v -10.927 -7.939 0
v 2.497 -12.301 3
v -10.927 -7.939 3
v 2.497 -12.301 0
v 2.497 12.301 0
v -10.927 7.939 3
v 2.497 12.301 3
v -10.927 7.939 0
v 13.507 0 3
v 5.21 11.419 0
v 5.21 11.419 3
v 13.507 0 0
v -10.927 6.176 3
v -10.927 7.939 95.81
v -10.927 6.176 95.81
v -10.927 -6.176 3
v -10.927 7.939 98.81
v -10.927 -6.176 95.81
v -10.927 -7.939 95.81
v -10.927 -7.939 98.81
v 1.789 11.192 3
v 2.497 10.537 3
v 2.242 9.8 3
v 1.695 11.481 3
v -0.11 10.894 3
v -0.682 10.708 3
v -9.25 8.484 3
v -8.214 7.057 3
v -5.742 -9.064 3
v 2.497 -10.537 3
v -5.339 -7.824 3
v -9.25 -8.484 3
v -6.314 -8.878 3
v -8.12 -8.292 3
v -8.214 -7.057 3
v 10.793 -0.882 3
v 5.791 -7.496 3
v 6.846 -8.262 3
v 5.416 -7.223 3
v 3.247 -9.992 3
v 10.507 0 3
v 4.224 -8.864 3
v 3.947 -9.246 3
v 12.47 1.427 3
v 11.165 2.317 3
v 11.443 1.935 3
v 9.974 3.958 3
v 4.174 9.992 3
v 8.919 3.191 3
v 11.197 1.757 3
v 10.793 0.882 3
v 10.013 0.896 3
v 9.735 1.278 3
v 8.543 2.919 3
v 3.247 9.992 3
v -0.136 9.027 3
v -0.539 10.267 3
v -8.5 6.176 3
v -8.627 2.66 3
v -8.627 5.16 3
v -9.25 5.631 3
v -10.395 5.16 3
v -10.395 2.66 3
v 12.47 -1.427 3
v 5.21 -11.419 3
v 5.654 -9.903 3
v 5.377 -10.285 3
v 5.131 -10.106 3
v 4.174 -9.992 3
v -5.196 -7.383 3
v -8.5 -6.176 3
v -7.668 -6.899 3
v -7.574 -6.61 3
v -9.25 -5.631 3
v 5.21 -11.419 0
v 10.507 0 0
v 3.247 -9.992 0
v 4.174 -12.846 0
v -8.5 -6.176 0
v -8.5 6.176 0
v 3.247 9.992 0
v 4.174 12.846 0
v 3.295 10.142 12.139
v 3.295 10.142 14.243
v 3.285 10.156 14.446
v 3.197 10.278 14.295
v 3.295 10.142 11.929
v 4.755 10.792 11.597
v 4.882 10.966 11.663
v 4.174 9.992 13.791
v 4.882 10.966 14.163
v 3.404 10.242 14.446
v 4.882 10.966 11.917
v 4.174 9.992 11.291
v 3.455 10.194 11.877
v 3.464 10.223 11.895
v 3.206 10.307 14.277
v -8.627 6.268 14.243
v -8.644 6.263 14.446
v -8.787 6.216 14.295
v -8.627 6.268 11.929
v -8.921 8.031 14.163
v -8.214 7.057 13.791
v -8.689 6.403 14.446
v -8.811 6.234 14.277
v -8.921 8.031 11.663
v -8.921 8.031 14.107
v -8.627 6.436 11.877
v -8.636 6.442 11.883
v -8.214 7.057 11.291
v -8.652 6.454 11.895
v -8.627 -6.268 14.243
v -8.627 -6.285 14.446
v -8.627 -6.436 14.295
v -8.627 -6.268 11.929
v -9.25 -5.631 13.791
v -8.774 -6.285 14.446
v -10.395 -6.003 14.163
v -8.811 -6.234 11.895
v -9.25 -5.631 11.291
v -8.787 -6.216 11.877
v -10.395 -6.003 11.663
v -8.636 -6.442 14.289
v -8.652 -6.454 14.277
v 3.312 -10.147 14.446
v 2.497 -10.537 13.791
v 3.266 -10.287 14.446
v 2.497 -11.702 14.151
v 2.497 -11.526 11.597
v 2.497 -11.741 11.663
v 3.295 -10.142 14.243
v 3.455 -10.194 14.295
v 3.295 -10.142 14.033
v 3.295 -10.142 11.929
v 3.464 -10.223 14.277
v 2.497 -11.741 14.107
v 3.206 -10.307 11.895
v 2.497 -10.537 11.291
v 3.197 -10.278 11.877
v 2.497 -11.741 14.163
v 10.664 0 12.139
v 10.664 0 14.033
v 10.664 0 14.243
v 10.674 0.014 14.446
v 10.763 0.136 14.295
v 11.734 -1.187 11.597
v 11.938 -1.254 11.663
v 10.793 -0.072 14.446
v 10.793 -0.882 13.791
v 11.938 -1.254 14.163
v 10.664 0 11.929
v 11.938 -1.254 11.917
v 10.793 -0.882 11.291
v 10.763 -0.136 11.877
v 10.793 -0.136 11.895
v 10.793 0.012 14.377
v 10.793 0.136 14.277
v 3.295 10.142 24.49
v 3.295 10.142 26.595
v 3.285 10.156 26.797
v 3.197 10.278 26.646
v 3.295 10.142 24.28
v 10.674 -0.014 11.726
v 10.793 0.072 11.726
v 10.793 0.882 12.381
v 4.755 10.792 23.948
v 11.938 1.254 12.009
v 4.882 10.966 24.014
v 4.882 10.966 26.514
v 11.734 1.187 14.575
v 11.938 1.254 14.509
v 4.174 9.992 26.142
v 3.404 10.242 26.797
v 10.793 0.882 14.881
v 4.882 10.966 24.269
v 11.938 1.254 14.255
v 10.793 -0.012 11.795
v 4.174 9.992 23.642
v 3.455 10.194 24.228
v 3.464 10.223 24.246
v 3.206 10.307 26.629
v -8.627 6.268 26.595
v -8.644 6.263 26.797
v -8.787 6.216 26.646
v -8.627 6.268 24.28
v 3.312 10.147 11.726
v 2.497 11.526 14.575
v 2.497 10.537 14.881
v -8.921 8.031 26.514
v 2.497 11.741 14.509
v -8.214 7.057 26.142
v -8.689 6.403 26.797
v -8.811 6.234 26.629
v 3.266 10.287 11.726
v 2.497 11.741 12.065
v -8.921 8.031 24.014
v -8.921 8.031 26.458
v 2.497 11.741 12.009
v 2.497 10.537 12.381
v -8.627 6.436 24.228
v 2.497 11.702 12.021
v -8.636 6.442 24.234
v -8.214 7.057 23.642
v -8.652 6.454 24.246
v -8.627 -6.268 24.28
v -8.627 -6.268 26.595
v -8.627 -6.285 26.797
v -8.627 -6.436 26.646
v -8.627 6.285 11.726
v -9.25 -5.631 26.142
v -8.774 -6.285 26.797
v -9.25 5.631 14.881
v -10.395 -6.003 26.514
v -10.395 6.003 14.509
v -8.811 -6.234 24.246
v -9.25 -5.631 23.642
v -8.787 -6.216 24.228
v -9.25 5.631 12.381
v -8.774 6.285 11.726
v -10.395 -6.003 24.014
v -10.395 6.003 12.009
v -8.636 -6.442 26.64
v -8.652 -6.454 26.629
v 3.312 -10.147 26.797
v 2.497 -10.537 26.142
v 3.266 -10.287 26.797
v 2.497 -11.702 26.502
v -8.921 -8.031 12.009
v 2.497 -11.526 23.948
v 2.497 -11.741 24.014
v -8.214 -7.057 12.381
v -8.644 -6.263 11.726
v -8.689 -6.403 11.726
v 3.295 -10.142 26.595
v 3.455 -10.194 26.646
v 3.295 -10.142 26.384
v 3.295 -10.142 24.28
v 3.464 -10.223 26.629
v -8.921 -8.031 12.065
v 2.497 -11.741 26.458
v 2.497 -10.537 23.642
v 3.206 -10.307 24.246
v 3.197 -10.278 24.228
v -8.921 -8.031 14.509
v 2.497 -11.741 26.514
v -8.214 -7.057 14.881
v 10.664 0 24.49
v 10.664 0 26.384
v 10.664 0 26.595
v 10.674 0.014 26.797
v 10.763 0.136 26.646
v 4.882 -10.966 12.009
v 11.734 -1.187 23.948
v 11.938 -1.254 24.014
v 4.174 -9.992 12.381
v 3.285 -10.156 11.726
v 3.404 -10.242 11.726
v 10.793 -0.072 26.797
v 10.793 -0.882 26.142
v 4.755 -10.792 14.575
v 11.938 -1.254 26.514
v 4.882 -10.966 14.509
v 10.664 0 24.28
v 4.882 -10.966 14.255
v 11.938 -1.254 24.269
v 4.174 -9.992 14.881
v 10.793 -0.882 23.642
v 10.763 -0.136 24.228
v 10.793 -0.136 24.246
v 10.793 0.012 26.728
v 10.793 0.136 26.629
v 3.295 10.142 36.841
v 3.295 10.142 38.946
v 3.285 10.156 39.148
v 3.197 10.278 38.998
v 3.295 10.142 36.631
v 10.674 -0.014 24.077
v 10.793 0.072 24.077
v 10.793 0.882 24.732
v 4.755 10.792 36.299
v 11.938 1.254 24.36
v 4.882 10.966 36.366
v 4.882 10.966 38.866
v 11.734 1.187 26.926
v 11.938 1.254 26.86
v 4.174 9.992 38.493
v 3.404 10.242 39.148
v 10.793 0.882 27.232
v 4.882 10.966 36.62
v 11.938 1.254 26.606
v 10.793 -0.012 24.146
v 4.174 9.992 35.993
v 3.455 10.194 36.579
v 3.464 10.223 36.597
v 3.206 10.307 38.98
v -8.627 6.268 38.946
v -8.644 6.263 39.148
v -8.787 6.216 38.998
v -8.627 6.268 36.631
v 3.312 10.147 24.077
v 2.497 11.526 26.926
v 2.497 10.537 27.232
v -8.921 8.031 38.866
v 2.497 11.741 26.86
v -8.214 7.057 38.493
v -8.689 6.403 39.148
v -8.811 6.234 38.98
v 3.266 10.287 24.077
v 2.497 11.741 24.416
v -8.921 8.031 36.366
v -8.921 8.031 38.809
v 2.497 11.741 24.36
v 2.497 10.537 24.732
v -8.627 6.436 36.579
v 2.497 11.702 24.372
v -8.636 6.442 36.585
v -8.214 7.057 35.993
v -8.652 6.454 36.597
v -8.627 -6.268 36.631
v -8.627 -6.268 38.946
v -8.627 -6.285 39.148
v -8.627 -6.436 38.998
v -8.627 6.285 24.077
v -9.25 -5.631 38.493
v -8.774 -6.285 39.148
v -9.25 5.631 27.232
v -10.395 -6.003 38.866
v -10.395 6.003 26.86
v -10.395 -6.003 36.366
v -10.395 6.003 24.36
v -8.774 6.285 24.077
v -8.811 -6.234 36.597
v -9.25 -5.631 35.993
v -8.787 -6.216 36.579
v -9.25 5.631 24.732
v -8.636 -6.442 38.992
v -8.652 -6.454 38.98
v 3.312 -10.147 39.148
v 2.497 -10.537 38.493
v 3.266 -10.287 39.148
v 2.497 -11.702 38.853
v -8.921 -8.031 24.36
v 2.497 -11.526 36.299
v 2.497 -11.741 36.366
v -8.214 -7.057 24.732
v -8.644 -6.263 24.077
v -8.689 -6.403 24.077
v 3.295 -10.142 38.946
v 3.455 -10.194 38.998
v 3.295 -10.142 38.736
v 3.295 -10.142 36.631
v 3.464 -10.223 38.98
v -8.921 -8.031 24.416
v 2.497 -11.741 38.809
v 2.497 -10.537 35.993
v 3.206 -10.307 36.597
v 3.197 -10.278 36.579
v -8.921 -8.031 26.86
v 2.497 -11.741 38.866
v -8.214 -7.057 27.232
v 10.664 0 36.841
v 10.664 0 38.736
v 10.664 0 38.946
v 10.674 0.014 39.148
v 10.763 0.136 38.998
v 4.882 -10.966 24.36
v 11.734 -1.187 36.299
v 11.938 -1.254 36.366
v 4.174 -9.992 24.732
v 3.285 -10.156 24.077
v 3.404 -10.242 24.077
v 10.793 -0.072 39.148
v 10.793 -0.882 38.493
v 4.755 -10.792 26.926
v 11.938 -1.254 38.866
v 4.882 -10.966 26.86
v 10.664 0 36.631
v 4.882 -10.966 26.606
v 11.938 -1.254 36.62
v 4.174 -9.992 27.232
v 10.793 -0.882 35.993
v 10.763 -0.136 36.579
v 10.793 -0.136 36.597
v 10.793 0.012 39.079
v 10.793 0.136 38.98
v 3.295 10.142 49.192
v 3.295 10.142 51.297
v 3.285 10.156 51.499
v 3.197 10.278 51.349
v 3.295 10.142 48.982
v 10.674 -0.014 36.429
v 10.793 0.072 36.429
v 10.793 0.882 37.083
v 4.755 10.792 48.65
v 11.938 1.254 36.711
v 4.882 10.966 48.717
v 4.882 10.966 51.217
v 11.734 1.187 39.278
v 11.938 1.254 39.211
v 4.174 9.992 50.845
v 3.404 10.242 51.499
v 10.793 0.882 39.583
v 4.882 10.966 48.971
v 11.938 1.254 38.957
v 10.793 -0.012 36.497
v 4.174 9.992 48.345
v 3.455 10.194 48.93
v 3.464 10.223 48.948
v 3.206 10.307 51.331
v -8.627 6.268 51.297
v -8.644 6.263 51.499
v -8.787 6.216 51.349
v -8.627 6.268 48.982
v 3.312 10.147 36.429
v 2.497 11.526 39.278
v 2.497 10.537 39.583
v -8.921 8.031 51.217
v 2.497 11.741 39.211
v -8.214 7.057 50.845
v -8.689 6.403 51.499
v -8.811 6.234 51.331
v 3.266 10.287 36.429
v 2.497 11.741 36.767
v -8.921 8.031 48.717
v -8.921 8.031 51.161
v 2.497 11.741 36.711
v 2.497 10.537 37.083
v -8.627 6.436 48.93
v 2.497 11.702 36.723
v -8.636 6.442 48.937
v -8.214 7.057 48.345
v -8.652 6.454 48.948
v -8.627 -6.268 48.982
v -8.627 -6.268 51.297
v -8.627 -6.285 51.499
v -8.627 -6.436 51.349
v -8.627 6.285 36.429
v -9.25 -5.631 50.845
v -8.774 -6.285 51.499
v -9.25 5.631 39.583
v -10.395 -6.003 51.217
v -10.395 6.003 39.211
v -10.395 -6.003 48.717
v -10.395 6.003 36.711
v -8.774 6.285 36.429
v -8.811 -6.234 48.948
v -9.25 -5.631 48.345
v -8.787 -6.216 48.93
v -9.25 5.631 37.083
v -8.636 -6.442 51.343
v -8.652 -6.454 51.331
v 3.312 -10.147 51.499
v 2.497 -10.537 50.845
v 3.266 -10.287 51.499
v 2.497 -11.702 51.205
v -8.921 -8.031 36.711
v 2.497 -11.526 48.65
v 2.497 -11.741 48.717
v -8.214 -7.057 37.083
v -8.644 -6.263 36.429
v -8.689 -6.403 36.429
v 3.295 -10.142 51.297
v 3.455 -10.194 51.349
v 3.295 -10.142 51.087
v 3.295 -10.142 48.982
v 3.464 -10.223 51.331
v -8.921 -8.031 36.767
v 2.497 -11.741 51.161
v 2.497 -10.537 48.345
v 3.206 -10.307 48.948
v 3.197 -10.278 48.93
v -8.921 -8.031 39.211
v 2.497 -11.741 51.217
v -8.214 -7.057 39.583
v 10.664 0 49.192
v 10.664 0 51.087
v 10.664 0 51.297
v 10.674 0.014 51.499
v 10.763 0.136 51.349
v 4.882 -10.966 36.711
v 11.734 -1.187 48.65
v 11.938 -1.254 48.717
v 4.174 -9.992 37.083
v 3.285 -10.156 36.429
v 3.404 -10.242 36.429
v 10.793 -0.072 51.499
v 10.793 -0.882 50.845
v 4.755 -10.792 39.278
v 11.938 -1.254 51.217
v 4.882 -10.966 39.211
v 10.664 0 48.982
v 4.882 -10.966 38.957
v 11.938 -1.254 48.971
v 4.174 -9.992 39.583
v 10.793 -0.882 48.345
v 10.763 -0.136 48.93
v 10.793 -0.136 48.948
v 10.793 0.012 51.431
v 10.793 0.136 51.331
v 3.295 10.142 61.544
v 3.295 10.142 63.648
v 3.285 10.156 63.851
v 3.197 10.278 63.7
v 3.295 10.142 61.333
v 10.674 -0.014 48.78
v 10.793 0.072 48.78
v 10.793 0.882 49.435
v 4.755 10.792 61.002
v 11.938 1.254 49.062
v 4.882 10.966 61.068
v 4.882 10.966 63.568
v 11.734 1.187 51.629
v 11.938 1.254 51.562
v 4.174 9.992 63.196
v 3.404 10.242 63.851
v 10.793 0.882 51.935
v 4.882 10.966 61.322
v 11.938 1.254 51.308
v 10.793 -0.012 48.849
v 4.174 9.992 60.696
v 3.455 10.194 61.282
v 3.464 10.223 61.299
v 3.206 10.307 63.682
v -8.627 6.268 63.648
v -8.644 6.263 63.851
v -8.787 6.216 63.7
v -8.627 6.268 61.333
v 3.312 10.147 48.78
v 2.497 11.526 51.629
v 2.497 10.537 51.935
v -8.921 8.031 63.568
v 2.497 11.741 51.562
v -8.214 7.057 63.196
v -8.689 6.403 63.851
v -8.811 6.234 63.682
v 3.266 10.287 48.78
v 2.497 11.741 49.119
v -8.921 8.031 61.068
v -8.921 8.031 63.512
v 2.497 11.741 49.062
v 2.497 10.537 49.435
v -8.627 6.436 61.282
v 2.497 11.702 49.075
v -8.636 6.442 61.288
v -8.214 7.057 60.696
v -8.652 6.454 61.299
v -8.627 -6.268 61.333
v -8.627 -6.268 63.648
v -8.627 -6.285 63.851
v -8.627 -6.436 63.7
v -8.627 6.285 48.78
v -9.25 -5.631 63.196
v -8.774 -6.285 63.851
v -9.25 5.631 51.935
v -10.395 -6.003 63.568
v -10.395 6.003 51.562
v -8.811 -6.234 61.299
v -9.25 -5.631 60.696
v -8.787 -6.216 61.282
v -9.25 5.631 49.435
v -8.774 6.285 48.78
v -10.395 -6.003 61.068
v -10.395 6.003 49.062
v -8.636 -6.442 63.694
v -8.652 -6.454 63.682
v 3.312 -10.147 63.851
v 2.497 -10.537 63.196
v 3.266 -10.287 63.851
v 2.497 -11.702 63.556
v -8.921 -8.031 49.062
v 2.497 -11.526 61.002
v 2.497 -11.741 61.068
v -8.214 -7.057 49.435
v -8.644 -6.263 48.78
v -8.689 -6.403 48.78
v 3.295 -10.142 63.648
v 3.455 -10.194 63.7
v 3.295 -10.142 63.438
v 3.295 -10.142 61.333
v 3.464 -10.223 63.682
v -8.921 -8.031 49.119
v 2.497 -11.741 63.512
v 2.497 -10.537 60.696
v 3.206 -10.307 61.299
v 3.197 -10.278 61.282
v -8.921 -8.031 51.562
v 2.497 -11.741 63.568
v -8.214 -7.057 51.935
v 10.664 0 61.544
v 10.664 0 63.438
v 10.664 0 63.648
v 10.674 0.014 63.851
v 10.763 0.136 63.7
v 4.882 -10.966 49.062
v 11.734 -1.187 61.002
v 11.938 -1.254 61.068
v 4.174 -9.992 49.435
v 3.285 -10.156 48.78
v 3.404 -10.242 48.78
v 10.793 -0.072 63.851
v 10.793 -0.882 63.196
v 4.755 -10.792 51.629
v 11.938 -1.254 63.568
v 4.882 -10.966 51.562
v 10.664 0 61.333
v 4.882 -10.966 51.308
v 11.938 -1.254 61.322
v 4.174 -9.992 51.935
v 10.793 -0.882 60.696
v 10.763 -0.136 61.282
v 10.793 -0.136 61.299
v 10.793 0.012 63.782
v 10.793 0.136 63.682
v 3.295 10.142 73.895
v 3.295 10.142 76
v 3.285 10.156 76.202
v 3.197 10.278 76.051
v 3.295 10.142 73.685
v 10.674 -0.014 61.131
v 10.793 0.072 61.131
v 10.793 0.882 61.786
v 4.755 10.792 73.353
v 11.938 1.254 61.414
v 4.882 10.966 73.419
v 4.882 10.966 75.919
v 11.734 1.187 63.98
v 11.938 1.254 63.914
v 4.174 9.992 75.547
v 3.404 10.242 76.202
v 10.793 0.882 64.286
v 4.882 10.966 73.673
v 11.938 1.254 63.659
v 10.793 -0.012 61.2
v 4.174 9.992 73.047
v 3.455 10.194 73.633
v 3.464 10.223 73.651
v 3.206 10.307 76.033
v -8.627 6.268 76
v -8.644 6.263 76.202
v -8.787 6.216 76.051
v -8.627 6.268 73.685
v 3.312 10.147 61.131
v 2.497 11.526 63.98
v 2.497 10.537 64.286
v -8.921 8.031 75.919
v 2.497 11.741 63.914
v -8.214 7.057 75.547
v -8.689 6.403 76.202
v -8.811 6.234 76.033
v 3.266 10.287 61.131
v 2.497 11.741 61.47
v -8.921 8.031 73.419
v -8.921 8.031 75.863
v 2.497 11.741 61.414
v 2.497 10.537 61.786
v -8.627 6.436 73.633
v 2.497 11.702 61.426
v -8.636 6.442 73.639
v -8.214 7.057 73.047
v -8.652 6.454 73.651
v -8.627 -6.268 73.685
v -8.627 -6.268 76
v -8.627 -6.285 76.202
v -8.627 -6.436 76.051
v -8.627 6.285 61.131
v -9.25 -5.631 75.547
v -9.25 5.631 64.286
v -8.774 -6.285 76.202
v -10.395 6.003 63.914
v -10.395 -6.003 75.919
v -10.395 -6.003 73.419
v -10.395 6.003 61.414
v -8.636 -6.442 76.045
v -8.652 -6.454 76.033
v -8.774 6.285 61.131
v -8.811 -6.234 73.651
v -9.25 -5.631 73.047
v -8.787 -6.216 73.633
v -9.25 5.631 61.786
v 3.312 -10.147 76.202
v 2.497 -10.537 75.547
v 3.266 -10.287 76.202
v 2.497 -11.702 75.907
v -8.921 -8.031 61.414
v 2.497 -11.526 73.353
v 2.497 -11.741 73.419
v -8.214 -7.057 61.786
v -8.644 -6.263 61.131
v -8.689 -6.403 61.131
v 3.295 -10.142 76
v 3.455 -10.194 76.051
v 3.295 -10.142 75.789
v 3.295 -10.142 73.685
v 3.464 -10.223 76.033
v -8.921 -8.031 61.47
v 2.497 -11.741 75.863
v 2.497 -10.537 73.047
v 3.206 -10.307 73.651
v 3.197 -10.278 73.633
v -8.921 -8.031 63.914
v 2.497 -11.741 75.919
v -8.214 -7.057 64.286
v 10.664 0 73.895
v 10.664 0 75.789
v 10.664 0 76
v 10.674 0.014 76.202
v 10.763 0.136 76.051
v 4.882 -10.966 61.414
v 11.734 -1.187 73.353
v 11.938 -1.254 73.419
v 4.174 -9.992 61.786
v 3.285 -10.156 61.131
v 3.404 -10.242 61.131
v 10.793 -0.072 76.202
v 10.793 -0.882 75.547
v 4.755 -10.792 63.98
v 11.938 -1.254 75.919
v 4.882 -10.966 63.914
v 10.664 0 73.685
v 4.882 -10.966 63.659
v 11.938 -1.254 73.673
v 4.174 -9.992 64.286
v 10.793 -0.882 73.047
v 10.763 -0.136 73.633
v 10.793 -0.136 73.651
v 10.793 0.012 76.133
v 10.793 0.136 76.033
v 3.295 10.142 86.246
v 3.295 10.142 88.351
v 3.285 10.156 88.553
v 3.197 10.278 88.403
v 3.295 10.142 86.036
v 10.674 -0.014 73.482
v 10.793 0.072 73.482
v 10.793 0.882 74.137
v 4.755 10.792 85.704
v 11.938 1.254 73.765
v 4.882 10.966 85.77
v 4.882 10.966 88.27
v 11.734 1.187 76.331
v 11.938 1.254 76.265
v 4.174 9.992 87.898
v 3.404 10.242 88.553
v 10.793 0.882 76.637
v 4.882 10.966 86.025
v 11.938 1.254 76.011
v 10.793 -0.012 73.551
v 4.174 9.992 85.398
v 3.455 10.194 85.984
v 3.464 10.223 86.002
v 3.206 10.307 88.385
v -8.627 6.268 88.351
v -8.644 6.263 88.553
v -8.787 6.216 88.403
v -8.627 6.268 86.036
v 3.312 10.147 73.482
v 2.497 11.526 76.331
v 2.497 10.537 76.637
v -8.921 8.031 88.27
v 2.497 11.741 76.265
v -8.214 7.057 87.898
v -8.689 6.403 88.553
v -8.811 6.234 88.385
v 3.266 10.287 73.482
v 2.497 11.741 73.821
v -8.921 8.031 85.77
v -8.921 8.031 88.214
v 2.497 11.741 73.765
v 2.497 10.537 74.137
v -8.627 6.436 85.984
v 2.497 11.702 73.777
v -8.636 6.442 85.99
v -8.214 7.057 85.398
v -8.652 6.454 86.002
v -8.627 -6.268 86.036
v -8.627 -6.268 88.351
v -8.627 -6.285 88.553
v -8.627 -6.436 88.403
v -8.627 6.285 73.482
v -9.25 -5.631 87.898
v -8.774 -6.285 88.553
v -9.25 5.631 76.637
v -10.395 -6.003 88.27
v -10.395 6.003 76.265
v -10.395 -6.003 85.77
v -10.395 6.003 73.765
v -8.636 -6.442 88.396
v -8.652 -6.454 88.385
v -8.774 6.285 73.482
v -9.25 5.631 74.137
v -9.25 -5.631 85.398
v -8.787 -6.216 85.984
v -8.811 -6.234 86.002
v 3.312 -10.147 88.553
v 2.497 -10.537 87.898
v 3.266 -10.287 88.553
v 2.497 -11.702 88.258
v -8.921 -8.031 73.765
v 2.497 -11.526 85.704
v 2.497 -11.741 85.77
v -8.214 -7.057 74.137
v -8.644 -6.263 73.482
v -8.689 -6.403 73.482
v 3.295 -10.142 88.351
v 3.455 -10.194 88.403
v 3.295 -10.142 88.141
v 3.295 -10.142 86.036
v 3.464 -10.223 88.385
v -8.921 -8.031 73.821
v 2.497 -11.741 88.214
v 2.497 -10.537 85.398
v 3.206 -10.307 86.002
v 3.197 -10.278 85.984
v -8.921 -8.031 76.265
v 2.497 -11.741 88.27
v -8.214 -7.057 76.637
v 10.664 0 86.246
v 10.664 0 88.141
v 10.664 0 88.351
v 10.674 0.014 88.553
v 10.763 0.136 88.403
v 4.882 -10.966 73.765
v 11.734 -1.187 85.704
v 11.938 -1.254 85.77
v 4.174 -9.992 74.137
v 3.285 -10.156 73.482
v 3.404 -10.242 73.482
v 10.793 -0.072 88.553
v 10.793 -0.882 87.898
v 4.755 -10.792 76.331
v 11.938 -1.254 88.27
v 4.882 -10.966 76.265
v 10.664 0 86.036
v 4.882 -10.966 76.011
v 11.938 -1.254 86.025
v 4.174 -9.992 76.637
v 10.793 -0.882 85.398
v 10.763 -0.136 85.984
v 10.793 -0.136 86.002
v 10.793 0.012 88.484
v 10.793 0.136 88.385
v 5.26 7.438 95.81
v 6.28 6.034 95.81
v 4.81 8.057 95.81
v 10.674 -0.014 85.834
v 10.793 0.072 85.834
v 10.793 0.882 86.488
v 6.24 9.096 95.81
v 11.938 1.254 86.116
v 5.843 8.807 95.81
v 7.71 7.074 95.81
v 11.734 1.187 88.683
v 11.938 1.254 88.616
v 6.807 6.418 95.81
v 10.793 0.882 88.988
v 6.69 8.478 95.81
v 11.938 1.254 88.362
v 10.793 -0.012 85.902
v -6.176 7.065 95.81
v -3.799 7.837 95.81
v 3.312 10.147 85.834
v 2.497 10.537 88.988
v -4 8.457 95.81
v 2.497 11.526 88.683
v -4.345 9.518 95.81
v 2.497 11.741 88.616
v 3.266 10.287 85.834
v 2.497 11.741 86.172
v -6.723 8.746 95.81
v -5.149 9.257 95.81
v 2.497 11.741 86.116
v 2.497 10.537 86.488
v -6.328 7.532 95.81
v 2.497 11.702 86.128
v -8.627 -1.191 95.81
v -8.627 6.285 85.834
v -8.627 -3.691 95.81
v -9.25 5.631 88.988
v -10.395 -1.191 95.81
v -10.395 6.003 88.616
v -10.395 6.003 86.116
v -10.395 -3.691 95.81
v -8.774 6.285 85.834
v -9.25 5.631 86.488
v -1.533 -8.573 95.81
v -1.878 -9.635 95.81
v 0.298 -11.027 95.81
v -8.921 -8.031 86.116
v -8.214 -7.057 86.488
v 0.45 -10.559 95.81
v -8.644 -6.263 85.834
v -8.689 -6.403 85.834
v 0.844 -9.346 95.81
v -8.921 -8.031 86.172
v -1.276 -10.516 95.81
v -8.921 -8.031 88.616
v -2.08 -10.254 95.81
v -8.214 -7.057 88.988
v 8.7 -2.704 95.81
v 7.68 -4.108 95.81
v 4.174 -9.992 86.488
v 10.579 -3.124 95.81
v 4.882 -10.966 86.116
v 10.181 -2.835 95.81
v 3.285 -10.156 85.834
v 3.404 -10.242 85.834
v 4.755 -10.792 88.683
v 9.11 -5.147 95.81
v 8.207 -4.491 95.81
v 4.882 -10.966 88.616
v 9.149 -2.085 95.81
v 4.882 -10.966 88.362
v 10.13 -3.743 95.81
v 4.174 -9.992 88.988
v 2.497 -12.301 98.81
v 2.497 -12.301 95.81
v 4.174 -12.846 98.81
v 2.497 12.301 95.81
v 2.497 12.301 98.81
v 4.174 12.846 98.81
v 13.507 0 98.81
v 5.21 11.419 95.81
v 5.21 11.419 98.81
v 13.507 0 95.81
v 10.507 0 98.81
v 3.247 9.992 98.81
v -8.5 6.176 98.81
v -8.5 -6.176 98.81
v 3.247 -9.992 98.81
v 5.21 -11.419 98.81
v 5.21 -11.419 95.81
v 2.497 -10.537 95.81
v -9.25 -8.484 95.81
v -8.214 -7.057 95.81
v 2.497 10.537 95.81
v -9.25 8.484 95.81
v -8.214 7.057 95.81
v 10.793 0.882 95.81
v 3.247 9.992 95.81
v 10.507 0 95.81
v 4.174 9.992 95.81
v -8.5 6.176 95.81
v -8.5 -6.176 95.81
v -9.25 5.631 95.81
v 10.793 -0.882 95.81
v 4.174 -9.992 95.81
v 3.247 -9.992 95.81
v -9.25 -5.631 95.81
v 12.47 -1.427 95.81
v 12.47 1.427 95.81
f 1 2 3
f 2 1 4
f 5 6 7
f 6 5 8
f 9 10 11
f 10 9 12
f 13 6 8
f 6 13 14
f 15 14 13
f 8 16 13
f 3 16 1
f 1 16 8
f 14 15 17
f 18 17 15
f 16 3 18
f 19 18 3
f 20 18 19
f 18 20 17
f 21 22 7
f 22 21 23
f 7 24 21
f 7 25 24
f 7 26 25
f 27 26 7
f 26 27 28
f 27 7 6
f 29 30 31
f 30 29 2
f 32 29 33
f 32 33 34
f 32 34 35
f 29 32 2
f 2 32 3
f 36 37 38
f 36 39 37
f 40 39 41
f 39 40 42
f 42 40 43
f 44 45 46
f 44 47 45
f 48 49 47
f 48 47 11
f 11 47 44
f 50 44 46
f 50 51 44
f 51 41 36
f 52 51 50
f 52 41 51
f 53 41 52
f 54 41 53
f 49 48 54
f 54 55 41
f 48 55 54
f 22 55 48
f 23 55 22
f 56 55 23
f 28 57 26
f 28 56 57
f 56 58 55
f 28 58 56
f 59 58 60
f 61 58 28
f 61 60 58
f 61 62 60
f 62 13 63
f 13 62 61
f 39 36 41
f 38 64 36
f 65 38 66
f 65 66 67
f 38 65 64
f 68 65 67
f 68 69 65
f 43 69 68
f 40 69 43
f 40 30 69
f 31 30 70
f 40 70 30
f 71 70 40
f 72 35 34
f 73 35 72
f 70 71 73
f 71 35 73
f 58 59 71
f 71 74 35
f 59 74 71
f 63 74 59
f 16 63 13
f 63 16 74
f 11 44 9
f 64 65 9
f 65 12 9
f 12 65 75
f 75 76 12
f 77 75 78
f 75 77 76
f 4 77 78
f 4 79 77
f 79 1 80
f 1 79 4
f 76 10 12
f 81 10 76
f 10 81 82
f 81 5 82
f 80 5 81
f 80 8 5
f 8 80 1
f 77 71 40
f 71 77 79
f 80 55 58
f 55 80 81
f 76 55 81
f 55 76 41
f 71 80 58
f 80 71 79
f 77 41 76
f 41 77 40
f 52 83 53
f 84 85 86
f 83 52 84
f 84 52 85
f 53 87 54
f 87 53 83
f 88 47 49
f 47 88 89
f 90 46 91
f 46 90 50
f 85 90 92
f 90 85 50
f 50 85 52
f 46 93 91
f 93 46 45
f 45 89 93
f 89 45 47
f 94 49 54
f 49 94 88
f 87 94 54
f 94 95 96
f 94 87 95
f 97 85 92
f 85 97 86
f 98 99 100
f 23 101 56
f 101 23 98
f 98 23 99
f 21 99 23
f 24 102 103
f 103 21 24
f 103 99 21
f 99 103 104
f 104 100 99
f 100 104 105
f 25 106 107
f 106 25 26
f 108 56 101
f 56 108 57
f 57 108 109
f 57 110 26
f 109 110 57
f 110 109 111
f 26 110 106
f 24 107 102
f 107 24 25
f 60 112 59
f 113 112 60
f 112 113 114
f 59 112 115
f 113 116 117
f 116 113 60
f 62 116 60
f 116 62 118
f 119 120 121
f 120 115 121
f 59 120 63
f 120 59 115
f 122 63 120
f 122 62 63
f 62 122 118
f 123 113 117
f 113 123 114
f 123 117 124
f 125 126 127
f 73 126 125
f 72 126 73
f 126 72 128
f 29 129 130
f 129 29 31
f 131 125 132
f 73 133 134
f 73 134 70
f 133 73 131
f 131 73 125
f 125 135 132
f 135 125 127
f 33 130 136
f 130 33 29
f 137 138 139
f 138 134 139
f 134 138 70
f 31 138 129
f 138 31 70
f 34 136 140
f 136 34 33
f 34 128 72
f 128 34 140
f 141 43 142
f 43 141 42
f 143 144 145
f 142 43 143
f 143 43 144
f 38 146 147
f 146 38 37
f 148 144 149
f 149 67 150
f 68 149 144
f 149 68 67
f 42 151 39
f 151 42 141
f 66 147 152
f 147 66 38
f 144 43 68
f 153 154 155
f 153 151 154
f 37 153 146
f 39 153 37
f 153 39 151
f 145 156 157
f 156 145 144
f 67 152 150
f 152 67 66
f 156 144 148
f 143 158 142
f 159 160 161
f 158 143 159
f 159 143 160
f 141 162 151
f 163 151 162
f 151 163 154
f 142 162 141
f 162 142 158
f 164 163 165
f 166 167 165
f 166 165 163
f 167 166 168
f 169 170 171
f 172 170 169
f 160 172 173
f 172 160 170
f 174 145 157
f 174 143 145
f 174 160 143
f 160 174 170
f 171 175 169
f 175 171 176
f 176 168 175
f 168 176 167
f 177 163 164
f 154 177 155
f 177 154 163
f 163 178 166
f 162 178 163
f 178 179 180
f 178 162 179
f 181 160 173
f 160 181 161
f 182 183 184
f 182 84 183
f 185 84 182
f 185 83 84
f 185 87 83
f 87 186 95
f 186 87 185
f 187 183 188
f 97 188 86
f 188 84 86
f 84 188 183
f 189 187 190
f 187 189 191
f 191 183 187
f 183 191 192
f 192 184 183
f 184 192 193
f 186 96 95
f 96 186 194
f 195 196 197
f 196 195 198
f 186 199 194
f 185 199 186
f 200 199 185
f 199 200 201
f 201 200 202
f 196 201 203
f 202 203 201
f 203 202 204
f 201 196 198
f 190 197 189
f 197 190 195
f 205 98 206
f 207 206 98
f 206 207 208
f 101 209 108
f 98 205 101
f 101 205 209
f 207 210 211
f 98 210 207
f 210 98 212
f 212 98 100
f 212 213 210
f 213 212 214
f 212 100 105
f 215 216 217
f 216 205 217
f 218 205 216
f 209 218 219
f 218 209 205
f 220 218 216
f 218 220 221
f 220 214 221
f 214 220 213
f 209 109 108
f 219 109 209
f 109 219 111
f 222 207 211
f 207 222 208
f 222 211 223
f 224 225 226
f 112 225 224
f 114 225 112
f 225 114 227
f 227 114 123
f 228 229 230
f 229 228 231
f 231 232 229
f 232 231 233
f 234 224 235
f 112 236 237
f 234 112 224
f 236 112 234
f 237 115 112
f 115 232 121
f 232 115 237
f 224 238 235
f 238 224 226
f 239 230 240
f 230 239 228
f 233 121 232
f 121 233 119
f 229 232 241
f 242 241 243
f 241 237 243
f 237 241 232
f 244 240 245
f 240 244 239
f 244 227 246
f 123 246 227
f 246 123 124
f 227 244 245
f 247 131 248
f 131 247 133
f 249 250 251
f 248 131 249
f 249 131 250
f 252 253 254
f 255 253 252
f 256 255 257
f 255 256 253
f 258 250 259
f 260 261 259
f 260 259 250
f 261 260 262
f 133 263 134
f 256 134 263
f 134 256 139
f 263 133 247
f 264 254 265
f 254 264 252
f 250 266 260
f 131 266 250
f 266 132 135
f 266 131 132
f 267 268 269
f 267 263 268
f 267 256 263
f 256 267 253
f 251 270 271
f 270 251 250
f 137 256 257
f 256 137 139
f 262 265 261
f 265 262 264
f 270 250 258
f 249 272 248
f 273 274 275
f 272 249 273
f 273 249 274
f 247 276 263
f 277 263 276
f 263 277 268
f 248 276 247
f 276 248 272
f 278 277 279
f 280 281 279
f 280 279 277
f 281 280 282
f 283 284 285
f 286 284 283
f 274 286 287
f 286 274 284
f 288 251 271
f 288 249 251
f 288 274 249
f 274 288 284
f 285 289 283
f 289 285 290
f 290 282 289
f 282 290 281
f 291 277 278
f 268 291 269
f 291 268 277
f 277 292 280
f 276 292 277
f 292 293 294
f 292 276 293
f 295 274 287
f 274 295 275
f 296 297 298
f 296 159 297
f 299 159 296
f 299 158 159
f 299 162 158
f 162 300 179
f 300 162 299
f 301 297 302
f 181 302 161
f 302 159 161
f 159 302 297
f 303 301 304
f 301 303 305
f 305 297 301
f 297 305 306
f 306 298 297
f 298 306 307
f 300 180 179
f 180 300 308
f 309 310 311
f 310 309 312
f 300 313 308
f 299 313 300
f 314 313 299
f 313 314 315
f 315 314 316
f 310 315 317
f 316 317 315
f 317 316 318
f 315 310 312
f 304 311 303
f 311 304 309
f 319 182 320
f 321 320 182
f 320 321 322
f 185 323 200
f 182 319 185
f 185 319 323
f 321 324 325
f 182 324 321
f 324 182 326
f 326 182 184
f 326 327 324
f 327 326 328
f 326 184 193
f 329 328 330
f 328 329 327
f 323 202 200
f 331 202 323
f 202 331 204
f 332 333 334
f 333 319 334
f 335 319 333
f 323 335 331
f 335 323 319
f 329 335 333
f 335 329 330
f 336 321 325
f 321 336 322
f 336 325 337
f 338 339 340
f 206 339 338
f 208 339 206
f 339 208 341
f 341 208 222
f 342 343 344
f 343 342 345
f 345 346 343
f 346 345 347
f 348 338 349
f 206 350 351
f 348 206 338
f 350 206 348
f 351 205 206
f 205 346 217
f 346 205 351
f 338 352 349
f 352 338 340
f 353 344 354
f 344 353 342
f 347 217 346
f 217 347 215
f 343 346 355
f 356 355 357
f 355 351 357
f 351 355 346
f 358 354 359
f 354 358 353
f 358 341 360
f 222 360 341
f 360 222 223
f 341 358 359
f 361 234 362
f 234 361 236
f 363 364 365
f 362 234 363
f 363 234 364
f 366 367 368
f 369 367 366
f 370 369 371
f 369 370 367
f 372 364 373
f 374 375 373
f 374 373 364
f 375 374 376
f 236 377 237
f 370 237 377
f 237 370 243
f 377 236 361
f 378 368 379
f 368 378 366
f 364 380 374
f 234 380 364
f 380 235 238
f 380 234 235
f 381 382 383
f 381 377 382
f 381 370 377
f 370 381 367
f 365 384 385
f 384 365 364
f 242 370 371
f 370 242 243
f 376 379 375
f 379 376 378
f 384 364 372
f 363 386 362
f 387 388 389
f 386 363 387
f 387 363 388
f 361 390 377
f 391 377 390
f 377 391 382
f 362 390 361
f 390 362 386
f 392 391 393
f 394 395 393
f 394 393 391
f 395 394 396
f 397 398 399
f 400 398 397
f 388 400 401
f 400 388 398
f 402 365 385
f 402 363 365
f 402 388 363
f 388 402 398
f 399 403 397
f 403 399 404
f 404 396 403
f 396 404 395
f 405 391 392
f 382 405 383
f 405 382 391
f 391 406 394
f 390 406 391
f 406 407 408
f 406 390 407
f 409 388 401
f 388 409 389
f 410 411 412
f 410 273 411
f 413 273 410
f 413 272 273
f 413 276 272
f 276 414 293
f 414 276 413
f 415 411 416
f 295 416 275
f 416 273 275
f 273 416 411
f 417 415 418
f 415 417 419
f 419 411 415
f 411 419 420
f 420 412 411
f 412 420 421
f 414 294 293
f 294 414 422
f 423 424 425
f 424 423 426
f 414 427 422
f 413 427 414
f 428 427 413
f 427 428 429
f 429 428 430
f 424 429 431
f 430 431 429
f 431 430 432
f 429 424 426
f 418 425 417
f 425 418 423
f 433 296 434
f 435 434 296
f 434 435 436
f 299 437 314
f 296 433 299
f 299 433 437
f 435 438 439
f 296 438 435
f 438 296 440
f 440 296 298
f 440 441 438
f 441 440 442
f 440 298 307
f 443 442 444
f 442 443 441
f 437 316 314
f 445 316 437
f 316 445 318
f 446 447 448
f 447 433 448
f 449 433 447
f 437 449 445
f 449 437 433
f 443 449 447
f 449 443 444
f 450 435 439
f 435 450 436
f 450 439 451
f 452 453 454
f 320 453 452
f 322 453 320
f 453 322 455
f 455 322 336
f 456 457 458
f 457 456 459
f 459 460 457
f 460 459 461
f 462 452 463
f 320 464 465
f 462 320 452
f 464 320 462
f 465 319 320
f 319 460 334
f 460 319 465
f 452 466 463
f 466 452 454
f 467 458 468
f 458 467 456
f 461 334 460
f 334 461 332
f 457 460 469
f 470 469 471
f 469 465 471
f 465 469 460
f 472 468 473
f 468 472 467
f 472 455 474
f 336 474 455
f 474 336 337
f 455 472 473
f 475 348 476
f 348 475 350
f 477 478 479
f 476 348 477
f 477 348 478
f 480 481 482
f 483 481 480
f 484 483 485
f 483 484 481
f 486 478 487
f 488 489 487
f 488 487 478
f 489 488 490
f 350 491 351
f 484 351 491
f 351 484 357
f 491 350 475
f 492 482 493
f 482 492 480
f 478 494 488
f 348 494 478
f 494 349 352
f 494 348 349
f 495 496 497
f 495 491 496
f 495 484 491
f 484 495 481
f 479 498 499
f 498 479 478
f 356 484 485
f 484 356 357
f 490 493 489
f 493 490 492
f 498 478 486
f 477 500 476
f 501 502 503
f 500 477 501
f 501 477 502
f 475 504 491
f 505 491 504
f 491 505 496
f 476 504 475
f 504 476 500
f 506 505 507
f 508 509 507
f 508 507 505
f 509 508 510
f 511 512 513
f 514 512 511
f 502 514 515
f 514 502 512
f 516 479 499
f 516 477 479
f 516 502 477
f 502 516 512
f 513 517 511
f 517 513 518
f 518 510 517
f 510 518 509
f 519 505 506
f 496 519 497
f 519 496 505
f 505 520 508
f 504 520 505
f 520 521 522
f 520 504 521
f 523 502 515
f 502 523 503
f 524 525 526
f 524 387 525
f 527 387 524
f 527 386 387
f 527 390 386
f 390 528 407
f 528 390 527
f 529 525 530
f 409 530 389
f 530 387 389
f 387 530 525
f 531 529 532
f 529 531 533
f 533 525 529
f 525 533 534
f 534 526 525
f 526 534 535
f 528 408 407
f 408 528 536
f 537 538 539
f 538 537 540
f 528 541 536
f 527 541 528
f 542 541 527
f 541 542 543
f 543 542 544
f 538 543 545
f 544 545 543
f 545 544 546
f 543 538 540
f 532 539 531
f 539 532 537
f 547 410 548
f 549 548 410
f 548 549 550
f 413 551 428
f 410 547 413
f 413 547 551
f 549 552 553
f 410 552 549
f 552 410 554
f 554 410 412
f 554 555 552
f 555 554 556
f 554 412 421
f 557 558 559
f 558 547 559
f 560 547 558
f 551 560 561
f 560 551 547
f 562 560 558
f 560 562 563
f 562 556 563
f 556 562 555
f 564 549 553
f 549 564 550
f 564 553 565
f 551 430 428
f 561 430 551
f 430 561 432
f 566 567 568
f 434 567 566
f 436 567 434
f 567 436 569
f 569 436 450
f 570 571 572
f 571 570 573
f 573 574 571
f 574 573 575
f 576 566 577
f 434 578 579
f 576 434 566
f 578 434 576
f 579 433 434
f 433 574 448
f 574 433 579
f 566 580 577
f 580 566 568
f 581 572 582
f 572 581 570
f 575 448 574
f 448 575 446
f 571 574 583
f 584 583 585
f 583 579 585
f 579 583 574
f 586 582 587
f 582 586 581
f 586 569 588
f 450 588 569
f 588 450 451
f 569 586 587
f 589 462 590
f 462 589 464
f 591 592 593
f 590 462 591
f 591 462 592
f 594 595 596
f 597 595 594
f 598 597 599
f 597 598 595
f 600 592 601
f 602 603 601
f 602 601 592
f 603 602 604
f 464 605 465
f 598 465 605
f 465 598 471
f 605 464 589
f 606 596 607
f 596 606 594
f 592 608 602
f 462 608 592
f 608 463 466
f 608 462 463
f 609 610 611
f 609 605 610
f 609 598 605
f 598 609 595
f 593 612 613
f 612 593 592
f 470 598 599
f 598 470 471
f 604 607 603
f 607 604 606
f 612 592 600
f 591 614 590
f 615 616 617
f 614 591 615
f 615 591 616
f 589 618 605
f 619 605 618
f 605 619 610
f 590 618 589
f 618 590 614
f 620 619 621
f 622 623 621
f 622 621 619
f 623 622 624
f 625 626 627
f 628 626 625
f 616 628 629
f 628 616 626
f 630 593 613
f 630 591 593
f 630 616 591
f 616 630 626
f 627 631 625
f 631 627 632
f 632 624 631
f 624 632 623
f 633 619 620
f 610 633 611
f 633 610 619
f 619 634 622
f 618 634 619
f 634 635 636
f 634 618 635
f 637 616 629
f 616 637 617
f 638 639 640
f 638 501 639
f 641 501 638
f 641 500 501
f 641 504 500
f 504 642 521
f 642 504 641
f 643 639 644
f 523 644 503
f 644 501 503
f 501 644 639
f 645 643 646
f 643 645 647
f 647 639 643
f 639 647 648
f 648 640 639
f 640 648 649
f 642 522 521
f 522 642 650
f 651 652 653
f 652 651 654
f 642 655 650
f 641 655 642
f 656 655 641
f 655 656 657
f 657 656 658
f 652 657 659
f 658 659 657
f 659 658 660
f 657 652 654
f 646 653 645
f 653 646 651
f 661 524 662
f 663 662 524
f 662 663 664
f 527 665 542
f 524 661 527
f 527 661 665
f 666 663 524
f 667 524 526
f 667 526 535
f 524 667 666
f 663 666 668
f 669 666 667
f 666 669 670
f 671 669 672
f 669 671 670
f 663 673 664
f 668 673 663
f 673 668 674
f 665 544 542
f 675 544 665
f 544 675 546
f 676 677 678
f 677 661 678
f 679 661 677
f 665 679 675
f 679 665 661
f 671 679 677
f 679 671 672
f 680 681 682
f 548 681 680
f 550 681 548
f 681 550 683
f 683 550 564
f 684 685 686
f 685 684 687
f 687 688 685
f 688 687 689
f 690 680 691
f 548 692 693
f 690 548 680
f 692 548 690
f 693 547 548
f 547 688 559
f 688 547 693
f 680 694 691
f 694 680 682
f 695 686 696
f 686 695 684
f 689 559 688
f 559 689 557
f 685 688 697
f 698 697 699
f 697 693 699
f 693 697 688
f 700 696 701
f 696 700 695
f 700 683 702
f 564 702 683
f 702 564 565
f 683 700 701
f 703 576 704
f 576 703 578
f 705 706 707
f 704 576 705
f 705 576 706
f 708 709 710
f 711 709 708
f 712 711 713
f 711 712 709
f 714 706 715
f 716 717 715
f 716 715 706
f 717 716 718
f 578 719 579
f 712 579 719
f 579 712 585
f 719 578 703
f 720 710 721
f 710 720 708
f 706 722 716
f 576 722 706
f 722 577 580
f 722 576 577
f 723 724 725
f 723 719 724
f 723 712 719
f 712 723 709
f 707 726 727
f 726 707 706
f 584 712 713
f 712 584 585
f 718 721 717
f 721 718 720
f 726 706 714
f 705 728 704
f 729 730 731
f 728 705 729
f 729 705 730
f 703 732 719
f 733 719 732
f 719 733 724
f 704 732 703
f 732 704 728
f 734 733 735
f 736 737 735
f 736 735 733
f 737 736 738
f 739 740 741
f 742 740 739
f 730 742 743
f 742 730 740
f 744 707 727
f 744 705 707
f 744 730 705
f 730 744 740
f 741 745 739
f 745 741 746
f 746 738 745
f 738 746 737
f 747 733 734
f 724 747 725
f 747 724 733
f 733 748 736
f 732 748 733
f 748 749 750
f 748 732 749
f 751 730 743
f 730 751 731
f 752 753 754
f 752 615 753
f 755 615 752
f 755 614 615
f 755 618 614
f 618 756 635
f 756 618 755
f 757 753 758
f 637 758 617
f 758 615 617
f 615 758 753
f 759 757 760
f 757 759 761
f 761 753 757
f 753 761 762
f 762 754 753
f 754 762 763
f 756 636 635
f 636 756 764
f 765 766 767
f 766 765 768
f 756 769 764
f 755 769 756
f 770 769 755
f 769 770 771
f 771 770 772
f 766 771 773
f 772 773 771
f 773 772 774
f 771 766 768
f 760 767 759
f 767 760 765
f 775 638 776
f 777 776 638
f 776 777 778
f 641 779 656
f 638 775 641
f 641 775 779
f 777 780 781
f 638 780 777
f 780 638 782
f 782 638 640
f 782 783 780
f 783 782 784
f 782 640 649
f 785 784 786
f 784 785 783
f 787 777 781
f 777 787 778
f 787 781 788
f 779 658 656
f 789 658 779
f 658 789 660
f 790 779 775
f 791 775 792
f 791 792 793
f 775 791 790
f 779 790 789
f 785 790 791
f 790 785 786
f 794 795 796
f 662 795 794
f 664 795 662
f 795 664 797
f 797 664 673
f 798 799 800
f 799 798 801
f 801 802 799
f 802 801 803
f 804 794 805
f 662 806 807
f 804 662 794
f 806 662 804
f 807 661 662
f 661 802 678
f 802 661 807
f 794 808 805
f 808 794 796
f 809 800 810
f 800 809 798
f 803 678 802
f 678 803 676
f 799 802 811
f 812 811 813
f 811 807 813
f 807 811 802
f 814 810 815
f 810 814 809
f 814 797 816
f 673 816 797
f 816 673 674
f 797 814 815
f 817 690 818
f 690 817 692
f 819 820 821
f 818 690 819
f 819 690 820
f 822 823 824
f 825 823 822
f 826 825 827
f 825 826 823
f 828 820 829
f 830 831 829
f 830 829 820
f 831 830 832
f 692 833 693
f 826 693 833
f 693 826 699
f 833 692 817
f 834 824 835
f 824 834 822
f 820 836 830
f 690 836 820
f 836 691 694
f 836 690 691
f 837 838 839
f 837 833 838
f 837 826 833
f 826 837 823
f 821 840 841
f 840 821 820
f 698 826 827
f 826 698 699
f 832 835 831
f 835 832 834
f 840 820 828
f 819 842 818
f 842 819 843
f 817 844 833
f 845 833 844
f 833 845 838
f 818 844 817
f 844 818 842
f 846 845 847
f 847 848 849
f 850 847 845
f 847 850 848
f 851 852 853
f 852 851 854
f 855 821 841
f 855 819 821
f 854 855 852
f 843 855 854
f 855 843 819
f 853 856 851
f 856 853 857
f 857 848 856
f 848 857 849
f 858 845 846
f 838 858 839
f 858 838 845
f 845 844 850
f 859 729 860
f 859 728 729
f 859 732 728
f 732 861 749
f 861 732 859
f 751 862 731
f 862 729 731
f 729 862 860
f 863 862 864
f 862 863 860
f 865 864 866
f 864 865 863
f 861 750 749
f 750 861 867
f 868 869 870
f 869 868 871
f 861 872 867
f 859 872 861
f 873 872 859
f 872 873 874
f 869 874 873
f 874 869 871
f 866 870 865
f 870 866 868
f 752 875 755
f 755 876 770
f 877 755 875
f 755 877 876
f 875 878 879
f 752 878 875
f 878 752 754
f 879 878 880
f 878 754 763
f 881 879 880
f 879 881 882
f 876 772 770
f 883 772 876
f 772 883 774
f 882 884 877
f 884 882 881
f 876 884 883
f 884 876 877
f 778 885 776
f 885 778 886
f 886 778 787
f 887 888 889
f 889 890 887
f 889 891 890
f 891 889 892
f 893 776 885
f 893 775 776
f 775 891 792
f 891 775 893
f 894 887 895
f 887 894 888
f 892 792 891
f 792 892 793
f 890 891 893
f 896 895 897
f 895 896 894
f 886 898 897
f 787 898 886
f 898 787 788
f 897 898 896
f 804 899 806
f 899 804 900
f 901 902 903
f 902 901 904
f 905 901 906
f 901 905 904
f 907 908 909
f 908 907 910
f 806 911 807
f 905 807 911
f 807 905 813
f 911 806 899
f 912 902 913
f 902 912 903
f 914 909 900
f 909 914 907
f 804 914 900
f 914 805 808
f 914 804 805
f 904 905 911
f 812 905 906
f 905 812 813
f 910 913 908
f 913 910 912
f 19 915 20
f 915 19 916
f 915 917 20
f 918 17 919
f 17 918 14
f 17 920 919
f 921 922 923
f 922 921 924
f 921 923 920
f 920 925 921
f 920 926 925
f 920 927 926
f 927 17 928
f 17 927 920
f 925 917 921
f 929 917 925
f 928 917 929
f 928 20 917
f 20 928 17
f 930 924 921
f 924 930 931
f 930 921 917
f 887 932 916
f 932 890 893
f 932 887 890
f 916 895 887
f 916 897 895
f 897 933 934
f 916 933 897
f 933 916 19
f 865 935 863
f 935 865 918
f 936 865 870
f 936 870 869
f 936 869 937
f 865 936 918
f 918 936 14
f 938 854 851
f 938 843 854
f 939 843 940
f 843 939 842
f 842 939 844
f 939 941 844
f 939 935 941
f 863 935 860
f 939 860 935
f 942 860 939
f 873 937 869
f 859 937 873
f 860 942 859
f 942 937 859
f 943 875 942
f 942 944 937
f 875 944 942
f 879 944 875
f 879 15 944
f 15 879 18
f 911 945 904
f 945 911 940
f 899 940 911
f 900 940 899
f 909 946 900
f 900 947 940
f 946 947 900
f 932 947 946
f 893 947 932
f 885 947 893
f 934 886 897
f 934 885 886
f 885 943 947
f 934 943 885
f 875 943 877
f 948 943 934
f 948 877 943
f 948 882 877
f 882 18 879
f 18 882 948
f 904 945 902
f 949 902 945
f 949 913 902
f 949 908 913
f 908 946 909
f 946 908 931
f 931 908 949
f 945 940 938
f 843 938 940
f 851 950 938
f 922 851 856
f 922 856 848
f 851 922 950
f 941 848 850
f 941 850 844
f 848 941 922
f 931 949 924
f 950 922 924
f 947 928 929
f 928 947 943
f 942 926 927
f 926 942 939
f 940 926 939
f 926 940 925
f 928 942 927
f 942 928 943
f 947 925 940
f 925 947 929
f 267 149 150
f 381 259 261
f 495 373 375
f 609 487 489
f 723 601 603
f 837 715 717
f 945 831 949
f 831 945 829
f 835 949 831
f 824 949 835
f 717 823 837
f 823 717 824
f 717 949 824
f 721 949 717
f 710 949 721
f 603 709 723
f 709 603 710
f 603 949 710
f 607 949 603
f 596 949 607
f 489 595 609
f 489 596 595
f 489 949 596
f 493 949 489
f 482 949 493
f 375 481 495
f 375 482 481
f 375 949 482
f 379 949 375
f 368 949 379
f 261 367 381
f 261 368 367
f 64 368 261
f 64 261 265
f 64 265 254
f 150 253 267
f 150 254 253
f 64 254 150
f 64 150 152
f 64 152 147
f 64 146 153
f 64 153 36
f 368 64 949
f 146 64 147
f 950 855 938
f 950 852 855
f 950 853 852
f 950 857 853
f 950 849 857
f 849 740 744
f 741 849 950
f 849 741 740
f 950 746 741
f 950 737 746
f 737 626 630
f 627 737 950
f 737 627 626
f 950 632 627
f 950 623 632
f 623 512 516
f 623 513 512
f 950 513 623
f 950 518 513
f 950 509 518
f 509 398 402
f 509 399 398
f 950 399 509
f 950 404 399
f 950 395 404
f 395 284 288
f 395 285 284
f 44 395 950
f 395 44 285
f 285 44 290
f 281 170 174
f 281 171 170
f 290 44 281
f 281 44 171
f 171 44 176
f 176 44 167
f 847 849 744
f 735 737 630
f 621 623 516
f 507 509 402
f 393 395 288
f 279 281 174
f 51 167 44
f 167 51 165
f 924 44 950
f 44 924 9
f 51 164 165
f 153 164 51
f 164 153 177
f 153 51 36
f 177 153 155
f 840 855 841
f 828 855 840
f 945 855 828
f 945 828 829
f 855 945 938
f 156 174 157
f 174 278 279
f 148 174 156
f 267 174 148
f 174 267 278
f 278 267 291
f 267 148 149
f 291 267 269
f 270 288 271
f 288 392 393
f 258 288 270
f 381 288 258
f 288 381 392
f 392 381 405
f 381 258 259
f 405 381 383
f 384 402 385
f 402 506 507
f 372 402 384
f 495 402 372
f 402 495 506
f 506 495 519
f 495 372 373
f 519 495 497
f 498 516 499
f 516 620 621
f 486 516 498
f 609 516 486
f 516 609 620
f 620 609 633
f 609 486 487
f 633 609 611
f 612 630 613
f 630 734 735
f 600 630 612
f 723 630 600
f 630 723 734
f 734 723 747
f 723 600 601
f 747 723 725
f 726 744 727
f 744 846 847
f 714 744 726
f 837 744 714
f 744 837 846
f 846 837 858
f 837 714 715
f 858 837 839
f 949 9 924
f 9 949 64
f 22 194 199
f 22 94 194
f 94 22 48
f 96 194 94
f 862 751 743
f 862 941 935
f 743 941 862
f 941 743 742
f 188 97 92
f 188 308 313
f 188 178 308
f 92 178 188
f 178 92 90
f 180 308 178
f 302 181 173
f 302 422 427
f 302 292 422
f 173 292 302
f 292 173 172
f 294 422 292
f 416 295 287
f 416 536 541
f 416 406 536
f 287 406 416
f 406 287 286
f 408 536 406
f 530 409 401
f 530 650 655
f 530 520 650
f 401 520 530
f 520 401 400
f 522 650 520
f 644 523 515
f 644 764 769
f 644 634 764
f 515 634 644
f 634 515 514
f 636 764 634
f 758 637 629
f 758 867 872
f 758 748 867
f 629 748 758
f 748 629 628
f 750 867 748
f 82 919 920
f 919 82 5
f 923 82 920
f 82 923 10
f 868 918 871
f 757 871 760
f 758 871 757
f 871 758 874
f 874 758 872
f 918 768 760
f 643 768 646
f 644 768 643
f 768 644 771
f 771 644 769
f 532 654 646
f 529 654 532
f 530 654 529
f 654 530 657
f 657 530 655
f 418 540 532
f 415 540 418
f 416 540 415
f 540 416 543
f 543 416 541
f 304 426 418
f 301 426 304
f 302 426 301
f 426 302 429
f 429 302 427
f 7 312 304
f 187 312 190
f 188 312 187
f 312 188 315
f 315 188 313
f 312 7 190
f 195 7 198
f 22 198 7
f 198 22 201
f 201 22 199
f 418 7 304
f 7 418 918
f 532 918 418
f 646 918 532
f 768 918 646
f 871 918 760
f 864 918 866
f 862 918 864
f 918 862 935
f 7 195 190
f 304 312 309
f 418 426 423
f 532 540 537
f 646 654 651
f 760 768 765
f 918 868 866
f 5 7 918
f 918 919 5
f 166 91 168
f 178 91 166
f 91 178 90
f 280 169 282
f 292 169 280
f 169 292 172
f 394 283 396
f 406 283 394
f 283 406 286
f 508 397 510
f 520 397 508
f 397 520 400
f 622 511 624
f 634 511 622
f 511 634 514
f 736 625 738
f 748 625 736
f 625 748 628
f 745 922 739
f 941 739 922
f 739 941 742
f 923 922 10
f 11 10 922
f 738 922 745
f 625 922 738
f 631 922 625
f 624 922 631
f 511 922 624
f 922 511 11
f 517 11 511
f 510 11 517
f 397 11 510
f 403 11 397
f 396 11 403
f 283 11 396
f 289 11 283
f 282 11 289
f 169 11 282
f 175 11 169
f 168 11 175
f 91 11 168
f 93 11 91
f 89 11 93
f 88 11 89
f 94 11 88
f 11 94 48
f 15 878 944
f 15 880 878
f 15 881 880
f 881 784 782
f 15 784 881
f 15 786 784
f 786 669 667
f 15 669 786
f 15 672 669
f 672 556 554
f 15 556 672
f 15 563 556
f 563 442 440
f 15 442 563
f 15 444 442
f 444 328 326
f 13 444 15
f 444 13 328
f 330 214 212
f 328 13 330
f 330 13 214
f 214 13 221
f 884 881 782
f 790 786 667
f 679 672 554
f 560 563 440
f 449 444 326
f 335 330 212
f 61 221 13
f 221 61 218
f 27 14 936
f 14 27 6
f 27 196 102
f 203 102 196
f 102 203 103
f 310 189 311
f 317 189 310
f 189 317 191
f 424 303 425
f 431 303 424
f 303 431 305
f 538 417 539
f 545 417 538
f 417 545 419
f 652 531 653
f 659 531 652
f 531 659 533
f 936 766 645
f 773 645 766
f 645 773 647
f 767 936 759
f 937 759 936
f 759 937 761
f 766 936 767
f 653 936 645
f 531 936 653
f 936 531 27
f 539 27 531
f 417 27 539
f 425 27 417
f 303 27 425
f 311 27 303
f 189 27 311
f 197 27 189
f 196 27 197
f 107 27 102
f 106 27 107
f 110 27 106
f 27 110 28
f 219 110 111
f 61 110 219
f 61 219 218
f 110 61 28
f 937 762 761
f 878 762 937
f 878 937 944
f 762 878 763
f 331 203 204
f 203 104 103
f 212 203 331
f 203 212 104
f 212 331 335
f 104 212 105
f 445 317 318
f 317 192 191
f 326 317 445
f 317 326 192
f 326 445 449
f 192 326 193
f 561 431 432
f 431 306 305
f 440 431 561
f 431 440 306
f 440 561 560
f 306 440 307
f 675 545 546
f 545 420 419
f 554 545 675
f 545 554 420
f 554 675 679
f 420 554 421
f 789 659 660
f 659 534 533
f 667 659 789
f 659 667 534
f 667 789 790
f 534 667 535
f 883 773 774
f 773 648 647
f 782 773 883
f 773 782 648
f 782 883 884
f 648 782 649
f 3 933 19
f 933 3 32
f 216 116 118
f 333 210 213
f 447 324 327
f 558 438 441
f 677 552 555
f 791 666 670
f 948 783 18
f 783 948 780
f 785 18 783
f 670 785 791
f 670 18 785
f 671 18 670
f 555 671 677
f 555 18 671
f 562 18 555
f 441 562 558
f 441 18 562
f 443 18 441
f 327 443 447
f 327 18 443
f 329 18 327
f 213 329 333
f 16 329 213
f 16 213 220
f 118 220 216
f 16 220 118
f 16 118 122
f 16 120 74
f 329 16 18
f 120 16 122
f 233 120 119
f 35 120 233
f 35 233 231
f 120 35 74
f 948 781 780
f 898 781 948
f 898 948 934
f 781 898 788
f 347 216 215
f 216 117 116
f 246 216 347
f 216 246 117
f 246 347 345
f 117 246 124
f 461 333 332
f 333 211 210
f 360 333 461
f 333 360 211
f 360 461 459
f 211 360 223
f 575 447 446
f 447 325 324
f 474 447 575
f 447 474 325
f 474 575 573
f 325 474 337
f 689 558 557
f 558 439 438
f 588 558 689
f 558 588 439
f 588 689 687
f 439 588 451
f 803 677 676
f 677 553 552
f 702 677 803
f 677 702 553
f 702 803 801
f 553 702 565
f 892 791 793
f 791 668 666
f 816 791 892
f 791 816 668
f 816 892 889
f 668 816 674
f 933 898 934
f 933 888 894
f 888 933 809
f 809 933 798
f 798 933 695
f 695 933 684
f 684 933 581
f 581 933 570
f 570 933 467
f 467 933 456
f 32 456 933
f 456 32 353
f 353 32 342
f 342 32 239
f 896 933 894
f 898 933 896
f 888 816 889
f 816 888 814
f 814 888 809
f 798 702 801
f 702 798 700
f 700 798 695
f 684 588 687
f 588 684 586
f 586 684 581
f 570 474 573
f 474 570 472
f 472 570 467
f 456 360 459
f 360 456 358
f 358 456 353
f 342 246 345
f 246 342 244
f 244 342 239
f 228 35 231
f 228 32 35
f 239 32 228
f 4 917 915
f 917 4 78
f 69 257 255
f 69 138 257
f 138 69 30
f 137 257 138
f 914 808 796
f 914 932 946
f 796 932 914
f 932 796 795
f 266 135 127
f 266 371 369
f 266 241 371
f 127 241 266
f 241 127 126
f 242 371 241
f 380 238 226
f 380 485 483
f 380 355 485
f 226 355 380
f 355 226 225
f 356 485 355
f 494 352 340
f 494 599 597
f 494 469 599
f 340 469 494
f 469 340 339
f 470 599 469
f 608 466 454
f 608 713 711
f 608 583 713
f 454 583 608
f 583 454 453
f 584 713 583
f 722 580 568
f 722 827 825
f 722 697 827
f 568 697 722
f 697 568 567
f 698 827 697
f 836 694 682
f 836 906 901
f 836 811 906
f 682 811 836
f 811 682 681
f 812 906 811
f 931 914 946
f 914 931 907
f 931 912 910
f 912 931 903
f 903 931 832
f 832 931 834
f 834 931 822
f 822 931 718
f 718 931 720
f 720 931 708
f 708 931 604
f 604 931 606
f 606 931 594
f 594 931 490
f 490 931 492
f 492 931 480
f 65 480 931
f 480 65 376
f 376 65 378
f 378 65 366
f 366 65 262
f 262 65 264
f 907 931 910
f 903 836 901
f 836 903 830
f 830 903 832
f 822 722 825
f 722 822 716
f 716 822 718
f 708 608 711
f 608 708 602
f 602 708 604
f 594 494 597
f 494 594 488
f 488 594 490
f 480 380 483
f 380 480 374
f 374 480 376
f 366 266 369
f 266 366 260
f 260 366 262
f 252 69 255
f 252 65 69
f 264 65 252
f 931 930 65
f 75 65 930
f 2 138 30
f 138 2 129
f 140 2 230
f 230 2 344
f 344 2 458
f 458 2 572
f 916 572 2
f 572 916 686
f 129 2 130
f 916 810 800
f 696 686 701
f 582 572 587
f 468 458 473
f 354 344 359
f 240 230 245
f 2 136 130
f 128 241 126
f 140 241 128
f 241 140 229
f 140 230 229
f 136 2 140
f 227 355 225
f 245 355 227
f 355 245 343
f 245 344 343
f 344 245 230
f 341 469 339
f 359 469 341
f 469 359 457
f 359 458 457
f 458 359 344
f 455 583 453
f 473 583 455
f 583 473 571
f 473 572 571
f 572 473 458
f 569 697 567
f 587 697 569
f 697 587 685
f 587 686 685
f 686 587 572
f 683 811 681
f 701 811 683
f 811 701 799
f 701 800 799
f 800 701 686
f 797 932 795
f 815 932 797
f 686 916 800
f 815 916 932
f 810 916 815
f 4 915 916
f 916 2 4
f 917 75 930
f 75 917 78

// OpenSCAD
sides = 5;
supportThickness = 3;
strutThickness = 2.5;
strutAngle = 45;
numberOfSegments = 8;
insideDiameter = 17;

module dummy();

inradius = insideDiameter / 2;

diameter = inradius * 2 / cos(180/sides);

sideLength = diameter * sin(180/sides);
echo(inradius);
segmentHeight = sideLength * tan(strutAngle);
totalHeight = numberOfSegments*segmentHeight;

nudge = 0.01;

module ring() {
    render(convexity=2)
    difference() {
        cylinder(d=diameter+2*supportThickness, h=supportThickness, $fn=sides);
        translate([0,0,-nudge]) cylinder(d=diameter, h=supportThickness+2*nudge, $fn=sides);
    }
}

module segments() {
    render(convexity=4)
    intersection() {
        for(j=[0:numberOfSegments-1])
        for(i=[0:sides-1]) {
            rotate([0,0,360/sides*i])
            translate([diameter/2+strutThickness/2,0,j*segmentHeight])
            rotate([0,0,180/sides+90])
            rotate([0,90-strutAngle,0]) rotate([0,0,45]) cylinder(d=strutThickness, h=(sideLength*(diameter+strutThickness)/diameter)/cos(strutAngle), $fn=4);
        }
       cylinder(d=diameter+2*supportThickness, h=totalHeight, $fn=sides);
    }
}

ring();
segments();
translate([0,0,totalHeight-supportThickness]) ring();
for(i=[0:sides-1]) translate((diameter/2+supportThickness/2)*[cos(i*360/sides),sin(i*360/sides),0]) cylinder(d=supportThickness,h=totalHeight,$fn=sides);
